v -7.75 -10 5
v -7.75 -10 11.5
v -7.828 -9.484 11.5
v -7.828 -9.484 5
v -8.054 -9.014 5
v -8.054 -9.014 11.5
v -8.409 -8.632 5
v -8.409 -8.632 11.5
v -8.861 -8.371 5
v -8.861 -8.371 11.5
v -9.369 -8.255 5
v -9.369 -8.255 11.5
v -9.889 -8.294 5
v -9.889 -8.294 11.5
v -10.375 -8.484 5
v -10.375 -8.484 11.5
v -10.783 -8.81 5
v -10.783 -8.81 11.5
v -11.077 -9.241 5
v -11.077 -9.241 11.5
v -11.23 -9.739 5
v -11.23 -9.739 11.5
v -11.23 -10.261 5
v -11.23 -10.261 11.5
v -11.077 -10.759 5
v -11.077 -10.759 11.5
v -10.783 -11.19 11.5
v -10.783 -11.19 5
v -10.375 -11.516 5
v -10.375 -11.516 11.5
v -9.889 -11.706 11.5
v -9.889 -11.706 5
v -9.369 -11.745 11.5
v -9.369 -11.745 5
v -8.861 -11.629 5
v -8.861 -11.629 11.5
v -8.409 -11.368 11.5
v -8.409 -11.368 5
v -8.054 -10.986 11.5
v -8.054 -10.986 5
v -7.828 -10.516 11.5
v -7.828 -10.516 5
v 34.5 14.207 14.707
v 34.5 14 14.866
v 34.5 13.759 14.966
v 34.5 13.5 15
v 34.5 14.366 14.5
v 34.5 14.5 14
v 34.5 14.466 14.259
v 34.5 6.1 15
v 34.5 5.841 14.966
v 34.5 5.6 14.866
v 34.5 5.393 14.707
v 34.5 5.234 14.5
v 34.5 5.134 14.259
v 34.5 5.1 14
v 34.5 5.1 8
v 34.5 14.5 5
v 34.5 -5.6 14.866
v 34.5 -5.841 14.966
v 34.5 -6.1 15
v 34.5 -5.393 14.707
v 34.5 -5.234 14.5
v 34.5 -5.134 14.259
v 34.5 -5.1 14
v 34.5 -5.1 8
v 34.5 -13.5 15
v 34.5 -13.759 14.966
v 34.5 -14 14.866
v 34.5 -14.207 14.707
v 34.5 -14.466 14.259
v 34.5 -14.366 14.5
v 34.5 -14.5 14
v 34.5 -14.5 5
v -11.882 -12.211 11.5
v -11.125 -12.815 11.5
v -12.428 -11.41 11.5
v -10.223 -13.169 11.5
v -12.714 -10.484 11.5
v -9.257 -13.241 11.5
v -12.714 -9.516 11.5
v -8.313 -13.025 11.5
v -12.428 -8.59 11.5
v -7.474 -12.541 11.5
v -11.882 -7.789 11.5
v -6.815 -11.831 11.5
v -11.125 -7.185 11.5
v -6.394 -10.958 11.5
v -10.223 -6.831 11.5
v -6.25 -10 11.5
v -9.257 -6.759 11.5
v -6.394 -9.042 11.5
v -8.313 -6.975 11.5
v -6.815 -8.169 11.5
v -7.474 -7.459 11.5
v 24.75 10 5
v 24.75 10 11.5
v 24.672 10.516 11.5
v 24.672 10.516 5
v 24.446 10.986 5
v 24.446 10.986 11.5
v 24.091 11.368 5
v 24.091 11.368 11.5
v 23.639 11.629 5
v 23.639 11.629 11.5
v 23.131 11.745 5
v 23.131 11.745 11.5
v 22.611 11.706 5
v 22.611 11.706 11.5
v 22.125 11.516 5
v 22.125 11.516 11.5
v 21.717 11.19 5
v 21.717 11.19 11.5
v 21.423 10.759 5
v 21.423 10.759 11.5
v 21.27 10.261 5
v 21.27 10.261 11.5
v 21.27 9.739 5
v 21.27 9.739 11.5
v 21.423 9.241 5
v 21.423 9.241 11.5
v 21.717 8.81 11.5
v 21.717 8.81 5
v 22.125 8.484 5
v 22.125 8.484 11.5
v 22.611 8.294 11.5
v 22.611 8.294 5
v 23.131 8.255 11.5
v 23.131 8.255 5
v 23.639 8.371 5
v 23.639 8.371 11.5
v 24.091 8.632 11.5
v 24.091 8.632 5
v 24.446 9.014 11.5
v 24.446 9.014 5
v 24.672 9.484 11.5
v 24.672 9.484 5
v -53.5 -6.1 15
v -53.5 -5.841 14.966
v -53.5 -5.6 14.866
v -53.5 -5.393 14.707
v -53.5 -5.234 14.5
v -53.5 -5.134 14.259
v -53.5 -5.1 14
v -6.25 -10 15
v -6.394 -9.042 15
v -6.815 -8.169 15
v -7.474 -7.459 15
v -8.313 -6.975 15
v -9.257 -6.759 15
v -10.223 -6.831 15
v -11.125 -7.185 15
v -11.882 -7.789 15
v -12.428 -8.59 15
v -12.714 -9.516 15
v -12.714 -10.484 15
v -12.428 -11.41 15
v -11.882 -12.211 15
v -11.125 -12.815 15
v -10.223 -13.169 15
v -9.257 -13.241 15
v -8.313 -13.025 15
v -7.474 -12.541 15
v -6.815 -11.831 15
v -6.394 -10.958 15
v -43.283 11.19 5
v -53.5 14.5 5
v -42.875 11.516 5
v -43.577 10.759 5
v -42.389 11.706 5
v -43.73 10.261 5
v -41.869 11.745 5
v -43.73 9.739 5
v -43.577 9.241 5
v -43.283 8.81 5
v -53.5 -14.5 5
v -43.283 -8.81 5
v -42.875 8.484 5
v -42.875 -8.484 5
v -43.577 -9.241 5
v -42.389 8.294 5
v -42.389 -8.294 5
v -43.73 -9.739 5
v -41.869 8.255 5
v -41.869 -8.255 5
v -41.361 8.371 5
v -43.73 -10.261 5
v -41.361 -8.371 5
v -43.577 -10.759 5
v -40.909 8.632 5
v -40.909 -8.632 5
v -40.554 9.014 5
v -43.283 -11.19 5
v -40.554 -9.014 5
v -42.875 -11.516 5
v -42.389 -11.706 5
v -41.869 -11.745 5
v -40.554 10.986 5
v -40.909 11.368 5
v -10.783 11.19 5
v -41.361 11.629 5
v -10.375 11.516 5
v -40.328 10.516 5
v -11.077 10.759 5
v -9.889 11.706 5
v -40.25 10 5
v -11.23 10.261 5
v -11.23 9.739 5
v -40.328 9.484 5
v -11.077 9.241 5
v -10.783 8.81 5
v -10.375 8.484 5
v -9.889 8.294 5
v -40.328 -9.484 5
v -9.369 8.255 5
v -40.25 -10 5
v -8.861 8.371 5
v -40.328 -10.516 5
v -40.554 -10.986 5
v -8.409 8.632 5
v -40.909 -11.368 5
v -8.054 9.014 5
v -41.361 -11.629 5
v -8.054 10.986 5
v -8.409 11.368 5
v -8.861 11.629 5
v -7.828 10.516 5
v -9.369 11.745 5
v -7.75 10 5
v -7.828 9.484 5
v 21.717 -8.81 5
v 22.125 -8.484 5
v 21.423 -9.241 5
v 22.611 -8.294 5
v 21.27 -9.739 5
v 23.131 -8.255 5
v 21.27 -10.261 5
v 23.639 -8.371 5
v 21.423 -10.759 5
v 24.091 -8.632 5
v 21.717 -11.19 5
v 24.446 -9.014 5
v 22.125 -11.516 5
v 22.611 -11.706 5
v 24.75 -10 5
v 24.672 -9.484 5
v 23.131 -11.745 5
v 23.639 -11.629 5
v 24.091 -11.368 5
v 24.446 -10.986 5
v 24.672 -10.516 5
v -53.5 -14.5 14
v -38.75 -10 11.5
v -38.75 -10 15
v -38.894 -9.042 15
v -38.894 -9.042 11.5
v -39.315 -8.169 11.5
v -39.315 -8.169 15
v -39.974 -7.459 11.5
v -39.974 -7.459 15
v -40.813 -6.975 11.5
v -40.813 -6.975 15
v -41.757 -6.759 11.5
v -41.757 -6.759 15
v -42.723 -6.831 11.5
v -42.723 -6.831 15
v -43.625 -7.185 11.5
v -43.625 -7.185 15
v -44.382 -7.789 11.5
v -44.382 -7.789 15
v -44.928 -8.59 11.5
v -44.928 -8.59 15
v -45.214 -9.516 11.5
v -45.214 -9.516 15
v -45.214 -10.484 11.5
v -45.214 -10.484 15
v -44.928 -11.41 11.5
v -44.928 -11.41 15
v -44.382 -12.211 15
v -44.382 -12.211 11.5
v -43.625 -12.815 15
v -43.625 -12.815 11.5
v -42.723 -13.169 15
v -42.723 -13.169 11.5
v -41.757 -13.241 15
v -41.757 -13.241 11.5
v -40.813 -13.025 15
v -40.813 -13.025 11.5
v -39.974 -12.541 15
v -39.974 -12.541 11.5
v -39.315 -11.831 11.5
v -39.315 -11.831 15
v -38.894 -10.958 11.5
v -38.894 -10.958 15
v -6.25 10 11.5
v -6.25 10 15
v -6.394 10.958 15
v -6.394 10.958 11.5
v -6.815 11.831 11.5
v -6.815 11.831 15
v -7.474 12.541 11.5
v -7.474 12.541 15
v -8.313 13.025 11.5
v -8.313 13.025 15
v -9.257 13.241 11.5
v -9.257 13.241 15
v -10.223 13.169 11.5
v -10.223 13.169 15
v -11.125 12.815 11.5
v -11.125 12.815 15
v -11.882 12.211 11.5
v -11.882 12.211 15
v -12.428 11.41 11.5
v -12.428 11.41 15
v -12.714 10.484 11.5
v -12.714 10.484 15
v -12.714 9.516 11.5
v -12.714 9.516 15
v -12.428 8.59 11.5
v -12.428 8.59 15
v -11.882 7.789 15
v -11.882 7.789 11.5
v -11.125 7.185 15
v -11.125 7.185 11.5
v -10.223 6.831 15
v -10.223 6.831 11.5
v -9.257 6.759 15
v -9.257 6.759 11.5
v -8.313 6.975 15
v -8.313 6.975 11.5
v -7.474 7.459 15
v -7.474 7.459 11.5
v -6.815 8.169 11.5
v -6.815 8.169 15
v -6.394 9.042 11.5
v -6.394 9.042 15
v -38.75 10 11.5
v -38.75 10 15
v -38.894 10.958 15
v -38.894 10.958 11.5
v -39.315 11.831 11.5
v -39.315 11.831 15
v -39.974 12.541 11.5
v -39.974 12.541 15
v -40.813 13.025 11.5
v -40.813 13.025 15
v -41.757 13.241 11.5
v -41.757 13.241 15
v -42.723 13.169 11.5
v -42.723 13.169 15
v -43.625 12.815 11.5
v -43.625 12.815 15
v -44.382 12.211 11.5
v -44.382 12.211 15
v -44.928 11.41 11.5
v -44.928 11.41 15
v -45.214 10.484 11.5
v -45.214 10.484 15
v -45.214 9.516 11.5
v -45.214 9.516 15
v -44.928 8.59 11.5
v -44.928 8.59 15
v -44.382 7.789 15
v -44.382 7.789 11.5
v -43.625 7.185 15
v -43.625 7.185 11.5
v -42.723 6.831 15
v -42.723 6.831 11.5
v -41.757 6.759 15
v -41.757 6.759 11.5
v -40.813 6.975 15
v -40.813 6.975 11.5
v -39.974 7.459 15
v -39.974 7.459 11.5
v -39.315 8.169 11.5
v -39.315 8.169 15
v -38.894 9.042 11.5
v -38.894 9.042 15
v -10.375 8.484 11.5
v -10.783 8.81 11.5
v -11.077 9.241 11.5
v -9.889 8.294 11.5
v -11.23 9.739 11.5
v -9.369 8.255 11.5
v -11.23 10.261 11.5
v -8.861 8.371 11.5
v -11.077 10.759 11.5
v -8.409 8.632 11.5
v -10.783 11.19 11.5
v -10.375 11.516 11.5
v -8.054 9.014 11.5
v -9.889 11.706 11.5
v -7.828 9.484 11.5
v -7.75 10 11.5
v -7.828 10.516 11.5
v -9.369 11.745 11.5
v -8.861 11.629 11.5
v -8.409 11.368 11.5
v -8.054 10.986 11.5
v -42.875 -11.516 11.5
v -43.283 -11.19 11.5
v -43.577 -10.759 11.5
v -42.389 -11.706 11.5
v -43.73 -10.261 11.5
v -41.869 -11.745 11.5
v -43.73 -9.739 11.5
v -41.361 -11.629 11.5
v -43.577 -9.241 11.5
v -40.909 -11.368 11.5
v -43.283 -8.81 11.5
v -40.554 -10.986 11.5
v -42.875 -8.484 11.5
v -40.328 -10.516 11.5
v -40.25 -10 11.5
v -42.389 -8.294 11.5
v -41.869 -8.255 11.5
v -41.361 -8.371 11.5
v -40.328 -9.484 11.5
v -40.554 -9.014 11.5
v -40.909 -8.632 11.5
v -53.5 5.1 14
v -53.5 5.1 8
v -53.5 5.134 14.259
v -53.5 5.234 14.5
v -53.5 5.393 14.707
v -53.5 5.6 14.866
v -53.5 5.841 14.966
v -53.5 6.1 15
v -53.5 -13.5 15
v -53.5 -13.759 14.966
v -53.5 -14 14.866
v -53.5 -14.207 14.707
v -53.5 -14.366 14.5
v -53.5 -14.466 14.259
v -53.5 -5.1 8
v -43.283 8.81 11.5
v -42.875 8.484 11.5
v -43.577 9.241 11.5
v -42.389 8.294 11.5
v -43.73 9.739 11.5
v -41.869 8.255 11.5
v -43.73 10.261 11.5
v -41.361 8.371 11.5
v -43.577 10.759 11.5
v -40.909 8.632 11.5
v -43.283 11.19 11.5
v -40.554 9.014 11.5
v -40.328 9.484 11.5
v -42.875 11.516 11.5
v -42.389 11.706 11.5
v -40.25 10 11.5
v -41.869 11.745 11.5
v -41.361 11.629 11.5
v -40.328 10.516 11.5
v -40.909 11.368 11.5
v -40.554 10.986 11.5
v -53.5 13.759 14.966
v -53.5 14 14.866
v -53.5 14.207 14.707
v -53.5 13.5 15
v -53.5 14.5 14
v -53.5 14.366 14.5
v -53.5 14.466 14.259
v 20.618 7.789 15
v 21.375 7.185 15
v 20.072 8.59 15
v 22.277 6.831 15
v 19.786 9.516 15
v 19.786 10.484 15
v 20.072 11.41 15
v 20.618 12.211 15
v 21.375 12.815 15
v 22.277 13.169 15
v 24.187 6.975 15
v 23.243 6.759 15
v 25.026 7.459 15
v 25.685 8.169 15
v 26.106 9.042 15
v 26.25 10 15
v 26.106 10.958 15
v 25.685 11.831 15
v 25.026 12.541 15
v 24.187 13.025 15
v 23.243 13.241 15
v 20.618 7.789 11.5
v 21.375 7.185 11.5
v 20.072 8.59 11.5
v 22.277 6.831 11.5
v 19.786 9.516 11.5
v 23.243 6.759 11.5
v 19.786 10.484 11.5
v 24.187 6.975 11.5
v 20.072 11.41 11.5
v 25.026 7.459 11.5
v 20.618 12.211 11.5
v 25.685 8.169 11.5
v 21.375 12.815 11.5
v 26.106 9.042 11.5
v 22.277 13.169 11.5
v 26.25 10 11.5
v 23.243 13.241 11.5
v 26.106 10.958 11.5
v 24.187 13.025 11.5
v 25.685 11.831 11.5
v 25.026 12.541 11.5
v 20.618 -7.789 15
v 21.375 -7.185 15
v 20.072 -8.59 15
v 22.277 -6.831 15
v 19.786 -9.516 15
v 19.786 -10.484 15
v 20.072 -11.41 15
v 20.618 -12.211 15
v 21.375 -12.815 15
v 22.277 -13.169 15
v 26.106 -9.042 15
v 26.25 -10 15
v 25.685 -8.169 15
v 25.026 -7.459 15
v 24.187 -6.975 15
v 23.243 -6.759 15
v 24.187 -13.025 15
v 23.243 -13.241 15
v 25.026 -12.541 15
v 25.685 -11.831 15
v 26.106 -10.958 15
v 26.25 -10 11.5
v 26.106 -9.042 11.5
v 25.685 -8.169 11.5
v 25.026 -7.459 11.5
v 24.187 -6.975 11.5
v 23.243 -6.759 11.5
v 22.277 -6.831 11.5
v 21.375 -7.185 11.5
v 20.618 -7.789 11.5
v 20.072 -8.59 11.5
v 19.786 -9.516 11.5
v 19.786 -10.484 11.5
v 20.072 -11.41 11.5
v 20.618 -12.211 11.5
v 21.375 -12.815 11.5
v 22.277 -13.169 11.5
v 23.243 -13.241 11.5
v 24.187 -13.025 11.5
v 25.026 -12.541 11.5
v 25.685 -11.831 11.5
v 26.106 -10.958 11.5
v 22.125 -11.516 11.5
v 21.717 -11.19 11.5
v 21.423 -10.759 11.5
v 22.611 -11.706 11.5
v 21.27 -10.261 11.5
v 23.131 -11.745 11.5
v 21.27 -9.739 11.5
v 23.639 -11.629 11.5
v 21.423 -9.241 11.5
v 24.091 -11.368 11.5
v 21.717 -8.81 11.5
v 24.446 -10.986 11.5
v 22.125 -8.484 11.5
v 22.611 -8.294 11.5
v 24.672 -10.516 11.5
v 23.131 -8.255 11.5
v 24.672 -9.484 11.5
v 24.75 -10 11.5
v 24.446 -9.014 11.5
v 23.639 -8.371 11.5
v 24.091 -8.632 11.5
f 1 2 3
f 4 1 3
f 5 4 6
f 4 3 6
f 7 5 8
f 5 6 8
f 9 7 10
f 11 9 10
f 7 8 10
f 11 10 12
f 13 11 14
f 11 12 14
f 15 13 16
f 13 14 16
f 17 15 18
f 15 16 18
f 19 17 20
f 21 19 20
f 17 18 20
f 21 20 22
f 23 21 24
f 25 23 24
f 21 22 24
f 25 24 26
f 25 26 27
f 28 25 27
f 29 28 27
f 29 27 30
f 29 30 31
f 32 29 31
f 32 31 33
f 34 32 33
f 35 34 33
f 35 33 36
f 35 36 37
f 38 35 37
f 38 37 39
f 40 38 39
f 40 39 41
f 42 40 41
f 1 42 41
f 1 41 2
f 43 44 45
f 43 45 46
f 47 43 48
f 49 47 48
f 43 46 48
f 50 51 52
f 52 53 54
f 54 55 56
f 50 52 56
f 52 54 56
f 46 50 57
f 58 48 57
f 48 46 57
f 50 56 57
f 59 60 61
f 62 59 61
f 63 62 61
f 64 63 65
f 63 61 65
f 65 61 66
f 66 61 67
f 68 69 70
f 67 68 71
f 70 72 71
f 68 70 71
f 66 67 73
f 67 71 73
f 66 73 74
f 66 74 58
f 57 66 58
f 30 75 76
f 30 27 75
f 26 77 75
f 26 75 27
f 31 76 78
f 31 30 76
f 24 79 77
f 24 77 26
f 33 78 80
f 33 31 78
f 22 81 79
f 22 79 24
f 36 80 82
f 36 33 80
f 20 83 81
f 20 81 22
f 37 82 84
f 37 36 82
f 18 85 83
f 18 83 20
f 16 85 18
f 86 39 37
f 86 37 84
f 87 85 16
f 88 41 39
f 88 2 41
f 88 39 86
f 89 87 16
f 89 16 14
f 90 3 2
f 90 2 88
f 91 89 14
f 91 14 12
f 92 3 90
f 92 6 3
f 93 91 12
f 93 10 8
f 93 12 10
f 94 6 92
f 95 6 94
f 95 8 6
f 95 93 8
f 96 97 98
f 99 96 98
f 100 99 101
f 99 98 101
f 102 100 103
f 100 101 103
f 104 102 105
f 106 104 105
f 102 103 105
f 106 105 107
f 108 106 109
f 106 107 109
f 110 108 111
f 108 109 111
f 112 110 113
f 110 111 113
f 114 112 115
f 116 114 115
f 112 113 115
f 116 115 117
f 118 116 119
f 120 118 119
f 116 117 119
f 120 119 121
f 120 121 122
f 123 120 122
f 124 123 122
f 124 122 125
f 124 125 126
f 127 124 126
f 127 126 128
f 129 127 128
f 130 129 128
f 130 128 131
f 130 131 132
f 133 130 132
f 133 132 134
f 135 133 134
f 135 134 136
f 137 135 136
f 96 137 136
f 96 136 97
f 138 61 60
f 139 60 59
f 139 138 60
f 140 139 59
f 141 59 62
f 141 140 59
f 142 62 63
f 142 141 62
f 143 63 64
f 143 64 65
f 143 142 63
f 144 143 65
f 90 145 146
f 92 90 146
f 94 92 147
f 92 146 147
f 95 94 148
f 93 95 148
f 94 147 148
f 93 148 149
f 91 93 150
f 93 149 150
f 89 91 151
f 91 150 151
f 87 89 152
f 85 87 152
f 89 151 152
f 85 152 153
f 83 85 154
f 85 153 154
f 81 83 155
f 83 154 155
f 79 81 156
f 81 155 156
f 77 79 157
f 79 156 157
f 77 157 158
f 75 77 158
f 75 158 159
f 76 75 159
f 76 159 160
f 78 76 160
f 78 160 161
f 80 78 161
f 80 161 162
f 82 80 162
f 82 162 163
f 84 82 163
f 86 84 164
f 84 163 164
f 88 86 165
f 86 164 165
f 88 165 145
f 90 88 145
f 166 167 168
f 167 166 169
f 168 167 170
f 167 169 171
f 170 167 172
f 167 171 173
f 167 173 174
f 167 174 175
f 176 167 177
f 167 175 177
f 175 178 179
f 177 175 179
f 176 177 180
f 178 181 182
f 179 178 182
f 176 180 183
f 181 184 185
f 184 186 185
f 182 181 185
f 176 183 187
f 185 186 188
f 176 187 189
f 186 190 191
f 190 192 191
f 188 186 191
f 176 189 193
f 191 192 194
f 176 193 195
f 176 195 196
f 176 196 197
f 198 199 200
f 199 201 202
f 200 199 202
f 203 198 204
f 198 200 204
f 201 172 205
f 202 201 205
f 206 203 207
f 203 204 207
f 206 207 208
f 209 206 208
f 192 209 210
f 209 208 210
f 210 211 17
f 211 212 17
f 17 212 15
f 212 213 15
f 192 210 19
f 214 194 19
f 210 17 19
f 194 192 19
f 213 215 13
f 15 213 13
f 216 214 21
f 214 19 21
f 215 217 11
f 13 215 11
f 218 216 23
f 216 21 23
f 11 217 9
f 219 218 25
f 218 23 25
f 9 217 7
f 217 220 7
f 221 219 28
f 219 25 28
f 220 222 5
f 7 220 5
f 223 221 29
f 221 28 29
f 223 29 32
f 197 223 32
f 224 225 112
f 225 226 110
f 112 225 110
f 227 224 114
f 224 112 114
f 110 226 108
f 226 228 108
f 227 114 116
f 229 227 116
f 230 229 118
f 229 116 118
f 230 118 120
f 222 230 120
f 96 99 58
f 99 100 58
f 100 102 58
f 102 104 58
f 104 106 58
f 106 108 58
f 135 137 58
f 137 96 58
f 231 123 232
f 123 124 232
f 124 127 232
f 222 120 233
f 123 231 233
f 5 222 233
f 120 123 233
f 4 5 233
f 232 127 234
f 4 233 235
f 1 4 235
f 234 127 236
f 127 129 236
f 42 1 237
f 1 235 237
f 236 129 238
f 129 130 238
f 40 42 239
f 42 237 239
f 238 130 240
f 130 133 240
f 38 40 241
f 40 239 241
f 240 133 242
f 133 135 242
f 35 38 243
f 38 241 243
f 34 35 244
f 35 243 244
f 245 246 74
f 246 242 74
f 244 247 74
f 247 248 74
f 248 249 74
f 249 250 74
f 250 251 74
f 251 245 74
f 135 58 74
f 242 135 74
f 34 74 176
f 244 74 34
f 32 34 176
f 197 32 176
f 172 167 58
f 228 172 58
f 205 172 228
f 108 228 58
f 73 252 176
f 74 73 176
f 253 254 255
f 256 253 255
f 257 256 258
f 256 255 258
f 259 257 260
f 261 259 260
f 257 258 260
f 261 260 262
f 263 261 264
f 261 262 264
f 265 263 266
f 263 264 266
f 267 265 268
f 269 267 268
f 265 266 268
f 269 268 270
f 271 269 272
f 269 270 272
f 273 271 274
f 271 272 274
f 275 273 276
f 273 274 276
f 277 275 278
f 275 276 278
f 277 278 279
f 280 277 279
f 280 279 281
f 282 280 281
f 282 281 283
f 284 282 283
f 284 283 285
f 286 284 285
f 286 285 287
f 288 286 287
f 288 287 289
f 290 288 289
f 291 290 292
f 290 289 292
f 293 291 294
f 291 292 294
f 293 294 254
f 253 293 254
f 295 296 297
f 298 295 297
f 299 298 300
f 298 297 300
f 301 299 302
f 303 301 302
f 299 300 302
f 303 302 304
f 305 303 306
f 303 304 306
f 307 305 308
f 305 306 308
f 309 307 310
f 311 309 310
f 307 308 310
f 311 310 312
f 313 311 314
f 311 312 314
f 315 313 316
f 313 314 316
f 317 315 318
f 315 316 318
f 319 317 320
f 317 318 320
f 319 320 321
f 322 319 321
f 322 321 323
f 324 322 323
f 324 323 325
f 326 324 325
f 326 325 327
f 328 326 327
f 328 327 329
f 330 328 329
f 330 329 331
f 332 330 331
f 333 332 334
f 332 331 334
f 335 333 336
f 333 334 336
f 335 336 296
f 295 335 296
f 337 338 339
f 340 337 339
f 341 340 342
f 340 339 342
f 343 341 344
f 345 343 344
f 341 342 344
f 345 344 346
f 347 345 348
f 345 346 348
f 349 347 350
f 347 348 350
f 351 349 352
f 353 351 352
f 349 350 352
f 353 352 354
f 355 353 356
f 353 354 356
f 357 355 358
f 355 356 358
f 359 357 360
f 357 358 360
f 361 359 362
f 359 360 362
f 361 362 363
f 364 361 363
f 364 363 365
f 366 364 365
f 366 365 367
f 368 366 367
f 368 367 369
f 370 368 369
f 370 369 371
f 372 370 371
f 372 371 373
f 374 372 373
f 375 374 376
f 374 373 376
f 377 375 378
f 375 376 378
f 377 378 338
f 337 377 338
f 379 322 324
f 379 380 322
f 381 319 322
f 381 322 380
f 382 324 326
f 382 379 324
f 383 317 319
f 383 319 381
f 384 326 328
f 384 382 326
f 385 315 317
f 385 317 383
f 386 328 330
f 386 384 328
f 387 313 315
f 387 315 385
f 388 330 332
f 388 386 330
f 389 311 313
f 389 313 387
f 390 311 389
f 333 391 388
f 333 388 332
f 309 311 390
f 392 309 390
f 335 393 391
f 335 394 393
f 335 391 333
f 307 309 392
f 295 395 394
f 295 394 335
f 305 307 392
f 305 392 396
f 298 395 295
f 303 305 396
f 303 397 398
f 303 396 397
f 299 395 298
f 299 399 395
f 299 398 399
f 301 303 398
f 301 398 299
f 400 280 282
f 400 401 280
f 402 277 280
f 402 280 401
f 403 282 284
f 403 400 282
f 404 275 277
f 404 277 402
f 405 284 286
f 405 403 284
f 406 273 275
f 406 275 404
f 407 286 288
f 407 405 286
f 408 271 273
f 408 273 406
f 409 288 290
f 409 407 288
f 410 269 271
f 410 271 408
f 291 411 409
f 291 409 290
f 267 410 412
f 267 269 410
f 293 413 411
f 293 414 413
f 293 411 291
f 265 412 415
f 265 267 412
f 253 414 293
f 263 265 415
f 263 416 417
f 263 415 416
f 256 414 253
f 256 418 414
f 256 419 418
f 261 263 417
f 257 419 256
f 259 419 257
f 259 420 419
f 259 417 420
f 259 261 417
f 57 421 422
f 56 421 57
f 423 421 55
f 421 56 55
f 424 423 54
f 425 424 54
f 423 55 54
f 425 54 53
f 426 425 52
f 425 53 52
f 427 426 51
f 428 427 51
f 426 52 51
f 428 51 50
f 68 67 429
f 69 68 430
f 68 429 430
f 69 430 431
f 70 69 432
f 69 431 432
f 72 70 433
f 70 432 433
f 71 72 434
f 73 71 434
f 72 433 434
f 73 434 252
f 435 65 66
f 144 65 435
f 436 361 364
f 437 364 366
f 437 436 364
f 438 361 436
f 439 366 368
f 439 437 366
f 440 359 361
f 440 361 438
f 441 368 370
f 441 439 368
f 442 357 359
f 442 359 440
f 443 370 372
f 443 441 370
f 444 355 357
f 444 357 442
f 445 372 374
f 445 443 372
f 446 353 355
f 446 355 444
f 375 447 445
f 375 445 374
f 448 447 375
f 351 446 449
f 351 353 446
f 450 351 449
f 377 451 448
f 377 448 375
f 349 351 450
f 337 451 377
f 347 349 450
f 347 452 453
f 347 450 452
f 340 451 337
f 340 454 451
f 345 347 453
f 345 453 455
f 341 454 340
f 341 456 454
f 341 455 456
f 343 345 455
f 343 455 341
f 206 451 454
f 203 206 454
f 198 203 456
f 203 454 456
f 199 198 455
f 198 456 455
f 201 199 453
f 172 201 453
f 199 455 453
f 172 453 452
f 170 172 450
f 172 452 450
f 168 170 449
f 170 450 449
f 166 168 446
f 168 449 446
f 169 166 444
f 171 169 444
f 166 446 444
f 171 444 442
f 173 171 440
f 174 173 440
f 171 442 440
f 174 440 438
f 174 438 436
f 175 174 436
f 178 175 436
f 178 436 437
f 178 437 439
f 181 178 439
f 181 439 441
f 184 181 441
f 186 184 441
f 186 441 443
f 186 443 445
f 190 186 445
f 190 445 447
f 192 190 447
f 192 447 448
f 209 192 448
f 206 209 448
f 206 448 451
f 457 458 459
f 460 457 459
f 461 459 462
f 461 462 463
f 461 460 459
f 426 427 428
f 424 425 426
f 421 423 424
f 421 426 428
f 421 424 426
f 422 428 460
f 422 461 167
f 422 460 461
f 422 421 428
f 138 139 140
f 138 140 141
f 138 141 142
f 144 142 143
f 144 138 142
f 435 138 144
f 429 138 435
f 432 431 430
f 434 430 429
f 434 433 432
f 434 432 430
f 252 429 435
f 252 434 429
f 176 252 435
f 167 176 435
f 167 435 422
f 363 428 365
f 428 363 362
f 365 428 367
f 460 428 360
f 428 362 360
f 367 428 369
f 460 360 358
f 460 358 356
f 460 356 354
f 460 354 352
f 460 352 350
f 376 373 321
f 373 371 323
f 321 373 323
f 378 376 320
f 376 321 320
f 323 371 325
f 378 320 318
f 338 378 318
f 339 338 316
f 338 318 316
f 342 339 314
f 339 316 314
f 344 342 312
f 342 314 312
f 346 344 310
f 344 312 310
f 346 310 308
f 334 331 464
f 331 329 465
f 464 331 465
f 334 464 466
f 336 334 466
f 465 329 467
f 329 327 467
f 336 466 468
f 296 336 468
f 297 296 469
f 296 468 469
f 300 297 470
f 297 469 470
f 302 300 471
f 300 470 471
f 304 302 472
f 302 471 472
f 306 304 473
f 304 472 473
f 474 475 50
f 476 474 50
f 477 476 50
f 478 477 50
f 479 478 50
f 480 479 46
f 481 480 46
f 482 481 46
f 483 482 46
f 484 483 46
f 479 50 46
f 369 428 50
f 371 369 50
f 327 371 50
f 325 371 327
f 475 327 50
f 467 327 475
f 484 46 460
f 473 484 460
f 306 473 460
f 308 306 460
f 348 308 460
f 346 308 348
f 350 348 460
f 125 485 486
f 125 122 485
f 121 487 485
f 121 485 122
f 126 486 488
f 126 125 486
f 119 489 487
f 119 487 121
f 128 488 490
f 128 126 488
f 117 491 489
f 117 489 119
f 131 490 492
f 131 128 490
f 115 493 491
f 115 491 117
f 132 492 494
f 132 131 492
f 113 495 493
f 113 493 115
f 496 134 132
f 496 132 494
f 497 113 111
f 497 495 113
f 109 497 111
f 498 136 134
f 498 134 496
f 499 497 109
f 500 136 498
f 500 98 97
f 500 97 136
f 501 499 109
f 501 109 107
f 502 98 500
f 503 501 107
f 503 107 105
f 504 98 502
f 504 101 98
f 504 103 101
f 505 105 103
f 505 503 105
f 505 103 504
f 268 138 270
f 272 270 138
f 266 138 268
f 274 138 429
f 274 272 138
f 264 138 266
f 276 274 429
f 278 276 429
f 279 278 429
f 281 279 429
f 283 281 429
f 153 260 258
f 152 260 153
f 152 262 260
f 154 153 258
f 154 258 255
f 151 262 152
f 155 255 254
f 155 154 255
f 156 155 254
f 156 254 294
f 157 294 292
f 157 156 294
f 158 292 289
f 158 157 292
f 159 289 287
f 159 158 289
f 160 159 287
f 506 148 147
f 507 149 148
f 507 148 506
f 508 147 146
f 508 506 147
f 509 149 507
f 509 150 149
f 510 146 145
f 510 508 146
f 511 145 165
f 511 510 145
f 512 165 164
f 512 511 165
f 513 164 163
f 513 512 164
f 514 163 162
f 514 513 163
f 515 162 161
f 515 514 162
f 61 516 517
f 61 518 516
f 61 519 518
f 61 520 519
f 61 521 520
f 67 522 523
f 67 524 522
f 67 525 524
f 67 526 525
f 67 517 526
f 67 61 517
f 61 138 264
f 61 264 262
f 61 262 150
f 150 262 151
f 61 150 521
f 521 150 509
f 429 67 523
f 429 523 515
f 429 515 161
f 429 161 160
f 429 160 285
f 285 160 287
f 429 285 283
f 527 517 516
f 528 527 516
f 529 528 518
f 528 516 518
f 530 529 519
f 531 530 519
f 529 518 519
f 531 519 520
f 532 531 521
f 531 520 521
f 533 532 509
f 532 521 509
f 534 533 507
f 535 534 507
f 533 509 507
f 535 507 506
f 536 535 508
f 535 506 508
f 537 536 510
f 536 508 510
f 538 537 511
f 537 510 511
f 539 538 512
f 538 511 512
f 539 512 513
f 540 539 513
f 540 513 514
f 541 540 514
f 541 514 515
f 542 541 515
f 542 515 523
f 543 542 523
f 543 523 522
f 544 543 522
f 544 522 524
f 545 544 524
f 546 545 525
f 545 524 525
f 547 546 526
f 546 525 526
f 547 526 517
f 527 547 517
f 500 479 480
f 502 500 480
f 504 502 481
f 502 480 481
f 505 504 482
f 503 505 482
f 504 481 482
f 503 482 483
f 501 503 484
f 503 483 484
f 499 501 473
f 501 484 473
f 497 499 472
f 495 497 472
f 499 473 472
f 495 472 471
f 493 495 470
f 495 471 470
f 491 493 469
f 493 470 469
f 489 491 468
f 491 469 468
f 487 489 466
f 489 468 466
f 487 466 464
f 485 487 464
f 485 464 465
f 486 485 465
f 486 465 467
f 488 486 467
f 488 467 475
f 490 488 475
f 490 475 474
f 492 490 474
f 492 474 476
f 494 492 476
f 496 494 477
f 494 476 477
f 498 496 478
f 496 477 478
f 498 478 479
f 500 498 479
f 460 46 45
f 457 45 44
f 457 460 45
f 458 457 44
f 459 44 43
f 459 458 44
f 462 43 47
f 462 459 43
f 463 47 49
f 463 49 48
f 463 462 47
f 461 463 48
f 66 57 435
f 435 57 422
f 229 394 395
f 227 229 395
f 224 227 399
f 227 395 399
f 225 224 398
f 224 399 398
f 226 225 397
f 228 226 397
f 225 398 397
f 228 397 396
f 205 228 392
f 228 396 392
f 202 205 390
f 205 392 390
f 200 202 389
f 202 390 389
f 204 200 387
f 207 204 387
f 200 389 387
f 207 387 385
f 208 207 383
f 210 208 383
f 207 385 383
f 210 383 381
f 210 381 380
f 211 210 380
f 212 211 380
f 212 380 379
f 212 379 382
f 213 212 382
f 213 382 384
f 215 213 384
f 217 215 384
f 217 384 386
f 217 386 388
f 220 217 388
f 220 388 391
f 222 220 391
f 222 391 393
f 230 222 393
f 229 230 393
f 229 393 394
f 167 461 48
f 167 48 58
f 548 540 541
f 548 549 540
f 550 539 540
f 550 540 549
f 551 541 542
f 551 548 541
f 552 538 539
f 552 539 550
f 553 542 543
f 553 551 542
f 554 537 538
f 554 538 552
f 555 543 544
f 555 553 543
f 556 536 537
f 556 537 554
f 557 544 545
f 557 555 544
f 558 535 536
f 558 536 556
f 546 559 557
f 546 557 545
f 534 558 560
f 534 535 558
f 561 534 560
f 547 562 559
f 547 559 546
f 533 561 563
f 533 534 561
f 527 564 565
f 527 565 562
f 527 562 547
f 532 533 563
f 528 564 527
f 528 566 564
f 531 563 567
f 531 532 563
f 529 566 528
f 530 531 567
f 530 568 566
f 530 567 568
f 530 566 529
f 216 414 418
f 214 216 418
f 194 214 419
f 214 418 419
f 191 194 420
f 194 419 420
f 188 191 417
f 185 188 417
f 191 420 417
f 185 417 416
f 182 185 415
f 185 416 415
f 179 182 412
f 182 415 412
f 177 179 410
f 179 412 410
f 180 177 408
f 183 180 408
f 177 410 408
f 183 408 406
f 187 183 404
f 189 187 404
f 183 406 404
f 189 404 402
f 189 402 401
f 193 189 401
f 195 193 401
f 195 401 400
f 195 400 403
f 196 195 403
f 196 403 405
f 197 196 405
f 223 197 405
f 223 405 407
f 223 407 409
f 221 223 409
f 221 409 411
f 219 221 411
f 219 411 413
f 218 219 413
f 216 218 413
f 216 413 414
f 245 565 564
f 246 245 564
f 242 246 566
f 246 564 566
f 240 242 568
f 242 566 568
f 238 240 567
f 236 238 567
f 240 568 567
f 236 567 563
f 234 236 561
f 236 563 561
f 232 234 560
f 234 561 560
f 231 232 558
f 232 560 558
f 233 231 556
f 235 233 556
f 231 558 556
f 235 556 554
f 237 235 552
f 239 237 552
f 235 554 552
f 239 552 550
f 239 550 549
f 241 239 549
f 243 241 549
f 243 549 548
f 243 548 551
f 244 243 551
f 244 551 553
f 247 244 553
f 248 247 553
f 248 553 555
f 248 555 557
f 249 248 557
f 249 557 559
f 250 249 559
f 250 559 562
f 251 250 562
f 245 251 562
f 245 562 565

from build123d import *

# Parameters (mm, degrees)
SKETCH_1_W          = 255
SKETCH_1_H          = 80
EXTRUDE_1_DEPTH     = 5
SKETCH_2_R          = 5
CUT_EXTRUDE_1_DEPTH = 5
SKETCH_3_R          = 4
CUT_EXTRUDE_2_DEPTH = 10
SKETCH_4_W          = 88
SKETCH_4_H          = 20
EXTRUDE_2_DEPTH     = 10
SKETCH_5_R          = 15
CUT_EXTRUDE_3_DEPTH = 10
SKETCH_6_R          = 7
EXTRUDE_3_DEPTH     = 15
HOLE_WIZARD_M6_1_D  = 5
CUT_EXTRUDE_4_DEPTH = 7
HOLE_WIZARD_M4_1_D  = 3.3
FILLET_1_R          = 10
SKETCH_13_R         = 6.969385005
EXTRUDE_5_DEPTH     = 5
SKETCH_14_W         = 5
SKETCH_14_H         = 75
EXTRUDE_6_DEPTH     = 80
SKETCH_15_W         = 20
SKETCH_15_H         = 5
EXTRUDE_7_DEPTH     = 80
EXTRUDE_8_DEPTH     = 5
SKETCH_17_R         = 3
CUT_EXTRUDE_5_DEPTH = 5
FILLET_2_R          = 1
SKETCH_18_W         = 309.613912266
SKETCH_18_H         = 134.290371586
CUT_EXTRUDE_6_DEPTH = 81
SKETCH_19_R         = 17
CUT_EXTRUDE_7_DEPTH = 11
SKETCH_20_W         = 10
SKETCH_20_H         = 4.5
EXTRUDE_9_DEPTH     = 88
SKETCH_21_R         = 1.75
CUT_EXTRUDE_8_DEPTH = 11
SKETCH_22_R         = 3.25
CUT_EXTRUDE_9_DEPTH = 3.5
FILLET_4_R          = 1


with BuildPart() as part:
    # 草图1 → 凸台-拉伸1 (new body)
    with BuildSketch(Plane.XY):
        Rectangle(SKETCH_1_W, SKETCH_1_H)
    extrude(amount=EXTRUDE_1_DEPTH)

    # 草图2 → 切除-拉伸1 (cut)
    with BuildSketch(Plane.XY.offset(5)):
        with Locations((-107.5, 0)):
            Circle(SKETCH_2_R)
    extrude(amount=-CUT_EXTRUDE_1_DEPTH, mode=Mode.SUBTRACT)

    # 草图3 → 切除-拉伸2 (cut)
    with BuildSketch(Plane.XY.offset(5)):
        with Locations((-45, 0)):
            Circle(SKETCH_3_R)
    extrude(amount=-CUT_EXTRUDE_2_DEPTH, mode=Mode.SUBTRACT)

    # 草图4 → 凸台-拉伸2 (add)
    with BuildSketch(Plane.XY.offset(5)):
        with Locations((-9.5, 0)):
            Rectangle(SKETCH_4_W, SKETCH_4_H)
    extrude(amount=EXTRUDE_2_DEPTH)

    # 草图5 → 切除-拉伸3 (cut)
    with BuildSketch(Plane.XY.offset(5)):
        with Locations((70, 0)):
            Circle(SKETCH_5_R)
    extrude(amount=-CUT_EXTRUDE_3_DEPTH, mode=Mode.SUBTRACT)

    # 草图6 → 凸台-拉伸3 (add)
    with BuildSketch(Plane(origin=(0, 0, 0), x_dir=(-1, 0, 0), z_dir=(0, 0, -1))):
        with Locations((107.5, 0)):
            Circle(SKETCH_6_R)
    extrude(amount=-EXTRUDE_3_DEPTH)

    # M6 螺纹孔1 (through all)
    with Locations(Plane.XY.offset(15)):
        with Locations((-107.5, 0)):
            Hole(HOLE_WIZARD_M6_1_D / 2)

    # 草图10 → 切除-拉伸4 (cut)
    with BuildSketch(Plane.XY.offset(15)):
        with BuildLine():
            Line((-53.5, 5.1), (34.5, 5.1))
            ThreePointArc((34.5, 5.1), (39.6, 0), (34.5, -5.1))
            Line((34.5, -5.1), (-53.5, -5.1))
            ThreePointArc((-53.5, -5.1), (-58.6, 0), (-53.5, 5.1))
        make_face()
    extrude(amount=-CUT_EXTRUDE_4_DEPTH, mode=Mode.SUBTRACT)

    # M4 螺纹孔1 (through all)
    with Locations(Plane(origin=(0, 0, 0), x_dir=(-1, 0, 0), z_dir=(0, 0, -1))):
        with Locations((-39.75, -26.5), (-39.75, -1.5), (-109.94007449, -26.5), (-100.25, -1.5)):
            Hole(HOLE_WIZARD_M4_1_D / 2)

    # 圆角1
    fillet_1_edges = [part.edges().sort_by_distance(p)[0] for p in [
        (-127.5, 40, 2.5),
        (-127.5, -40, 2.5),
    ]]
    fillet(fillet_1_edges, radius=FILLET_1_R)

    # 草图13 → 凸台-拉伸5 (add)
    with BuildSketch(Plane.XY.offset(5)):
        with Locations((-45, 0)):
            Circle(SKETCH_13_R)
    extrude(amount=-EXTRUDE_5_DEPTH)

    # 草图14 → 凸台-拉伸6 (add)
    with BuildSketch(Plane.XZ.offset(40)):
        with Locations((125, -37.5)):
            Rectangle(SKETCH_14_W, SKETCH_14_H)
    extrude(amount=-EXTRUDE_6_DEPTH)

    # 草图15 → 凸台-拉伸7 (add)
    with BuildSketch(Plane.XZ.offset(40)):
        with Locations((112.5, -72.5)):
            Rectangle(SKETCH_15_W, SKETCH_15_H)
    extrude(amount=-EXTRUDE_7_DEPTH)

    # 草图16 → 凸台-拉伸8 (add)
    with BuildSketch(Plane.XZ.offset(40)):
        Polygon((-32.5, 5), (-32.5, 0), (102.5, -75), (127.5, -75), (127.5, 5), align=None)
    extrude_8 = extrude(amount=-EXTRUDE_8_DEPTH)

    # 镜向1: 凸台-拉伸8 across plane
    add(extrude_8.mirror(Plane.ZX))

    # 草图17 → 切除-拉伸5 (cut)
    with BuildSketch(Plane(origin=(0, 0, -75), x_dir=(-1, 0, 0), z_dir=(0, 0, -1))):
        with Locations((-114.5, -15)):
            Circle(SKETCH_17_R)
        with Locations((-114.5, 15)):
            Circle(SKETCH_17_R)
    extrude(amount=-CUT_EXTRUDE_5_DEPTH, mode=Mode.SUBTRACT)

    # 圆角2
    fillet_2_edges = [part.edges().sort_by_distance(p)[0] for p in [
        (-127.5, 0, 0),
        (-124.571067812, 37.071067812, 0),
        (-124.571067812, -37.071067812, 0),
        (-127.5, 0, 5),
        (-124.571067812, 37.071067812, 5),
        (-124.571067812, -37.071067812, 5),
        (127.5, 0, -75),
        (115, -40, -75),
        (115, 40, -75),
        (127.5, 0, 5),
        (35, -40, -37.5),
        (35, -35, -37.5),
        (5, 40, 5),
        (-75, 40, 0),
        (35, 40, -37.5),
        (35, 35, -37.5),
        (127.5, 40, -35),
        (127.5, -40, -35),
        (-75, -40, 0),
        (5, -40, 5),
    ]]
    fillet(fillet_2_edges, radius=FILLET_2_R)

    # 草图18 → 切除-拉伸6 (cut, through all)
    with BuildSketch(Plane.XY.offset(5)):
        Rectangle(SKETCH_18_W, SKETCH_18_H)
    extrude(amount=-CUT_EXTRUDE_6_DEPTH, mode=Mode.SUBTRACT)

    # 草图19 → 切除-拉伸7 (cut, through all)
    with BuildSketch(Plane.XY.offset(15)):
        with Locations((-107.5, 0)):
            Circle(SKETCH_19_R)
    extrude(amount=-CUT_EXTRUDE_7_DEPTH, mode=Mode.SUBTRACT)

    # 草图20 → 凸台-拉伸9 (add)
    with BuildSketch(Plane(origin=(34.5, 0, 0), x_dir=(0, 0, -1), z_dir=(1, 0, 0))):
        with Locations((-10, 12.25)):
            Rectangle(SKETCH_20_W, SKETCH_20_H)
    extrude_9 = extrude(amount=-EXTRUDE_9_DEPTH)

    # 镜向2: 凸台-拉伸9 across plane
    add(extrude_9.mirror(Plane.ZX))

    # 草图21 → 切除-拉伸8 (cut, through all)
    with BuildSketch(Plane.XY.offset(15)):
        with Locations((-42, 10)):
            Circle(SKETCH_21_R)
        with Locations((-9.5, 10)):
            Circle(SKETCH_21_R)
        with Locations((23, 10)):
            Circle(SKETCH_21_R)
        with Locations((23, -10)):
            Circle(SKETCH_21_R)
        with Locations((-9.5, -10)):
            Circle(SKETCH_21_R)
        with Locations((-42, -10)):
            Circle(SKETCH_21_R)
    extrude(amount=-CUT_EXTRUDE_8_DEPTH, mode=Mode.SUBTRACT)

    # 草图22 → 切除-拉伸9 (cut)
    with BuildSketch(Plane.XY.offset(15)):
        with Locations((-42, 10)):
            Circle(SKETCH_22_R)
        with Locations((-9.5, 10)):
            Circle(SKETCH_22_R)
        with Locations((23, 10)):
            Circle(SKETCH_22_R)
        with Locations((23, -10)):
            Circle(SKETCH_22_R)
        with Locations((-9.5, -10)):
            Circle(SKETCH_22_R)
        with Locations((-42, -10)):
            Circle(SKETCH_22_R)
    extrude(amount=-CUT_EXTRUDE_9_DEPTH, mode=Mode.SUBTRACT)

    # 圆角4
    fillet_4_edges = [part.edges().sort_by_distance(p)[0] for p in [
        (-9.5, 14.5, 15),
        (-9.5, -14.5, 15),
        (-9.5, 5.1, 15),
        (-9.5, -5.1, 15),
    ]]
    fillet(fillet_4_edges, radius=FILLET_4_R)


solid = part.part
